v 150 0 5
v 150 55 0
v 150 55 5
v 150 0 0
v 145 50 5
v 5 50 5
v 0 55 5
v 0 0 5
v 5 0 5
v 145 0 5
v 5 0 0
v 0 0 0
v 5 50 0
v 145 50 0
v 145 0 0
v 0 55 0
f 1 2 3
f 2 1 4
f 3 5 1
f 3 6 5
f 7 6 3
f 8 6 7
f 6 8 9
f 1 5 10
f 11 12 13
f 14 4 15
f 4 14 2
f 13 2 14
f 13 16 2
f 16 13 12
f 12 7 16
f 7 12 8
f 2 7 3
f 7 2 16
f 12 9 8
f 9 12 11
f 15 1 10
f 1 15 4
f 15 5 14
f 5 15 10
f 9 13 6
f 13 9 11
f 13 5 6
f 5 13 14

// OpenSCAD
$fa=4; // default minimum facet angle is now 0.5
$fs=0.05; // default minimum facet size is now 0.05 mm

difference() {
  cube([150, 55, 5]);
  translate([5, -1, -1]) cube([140, 51, 7]);
}
